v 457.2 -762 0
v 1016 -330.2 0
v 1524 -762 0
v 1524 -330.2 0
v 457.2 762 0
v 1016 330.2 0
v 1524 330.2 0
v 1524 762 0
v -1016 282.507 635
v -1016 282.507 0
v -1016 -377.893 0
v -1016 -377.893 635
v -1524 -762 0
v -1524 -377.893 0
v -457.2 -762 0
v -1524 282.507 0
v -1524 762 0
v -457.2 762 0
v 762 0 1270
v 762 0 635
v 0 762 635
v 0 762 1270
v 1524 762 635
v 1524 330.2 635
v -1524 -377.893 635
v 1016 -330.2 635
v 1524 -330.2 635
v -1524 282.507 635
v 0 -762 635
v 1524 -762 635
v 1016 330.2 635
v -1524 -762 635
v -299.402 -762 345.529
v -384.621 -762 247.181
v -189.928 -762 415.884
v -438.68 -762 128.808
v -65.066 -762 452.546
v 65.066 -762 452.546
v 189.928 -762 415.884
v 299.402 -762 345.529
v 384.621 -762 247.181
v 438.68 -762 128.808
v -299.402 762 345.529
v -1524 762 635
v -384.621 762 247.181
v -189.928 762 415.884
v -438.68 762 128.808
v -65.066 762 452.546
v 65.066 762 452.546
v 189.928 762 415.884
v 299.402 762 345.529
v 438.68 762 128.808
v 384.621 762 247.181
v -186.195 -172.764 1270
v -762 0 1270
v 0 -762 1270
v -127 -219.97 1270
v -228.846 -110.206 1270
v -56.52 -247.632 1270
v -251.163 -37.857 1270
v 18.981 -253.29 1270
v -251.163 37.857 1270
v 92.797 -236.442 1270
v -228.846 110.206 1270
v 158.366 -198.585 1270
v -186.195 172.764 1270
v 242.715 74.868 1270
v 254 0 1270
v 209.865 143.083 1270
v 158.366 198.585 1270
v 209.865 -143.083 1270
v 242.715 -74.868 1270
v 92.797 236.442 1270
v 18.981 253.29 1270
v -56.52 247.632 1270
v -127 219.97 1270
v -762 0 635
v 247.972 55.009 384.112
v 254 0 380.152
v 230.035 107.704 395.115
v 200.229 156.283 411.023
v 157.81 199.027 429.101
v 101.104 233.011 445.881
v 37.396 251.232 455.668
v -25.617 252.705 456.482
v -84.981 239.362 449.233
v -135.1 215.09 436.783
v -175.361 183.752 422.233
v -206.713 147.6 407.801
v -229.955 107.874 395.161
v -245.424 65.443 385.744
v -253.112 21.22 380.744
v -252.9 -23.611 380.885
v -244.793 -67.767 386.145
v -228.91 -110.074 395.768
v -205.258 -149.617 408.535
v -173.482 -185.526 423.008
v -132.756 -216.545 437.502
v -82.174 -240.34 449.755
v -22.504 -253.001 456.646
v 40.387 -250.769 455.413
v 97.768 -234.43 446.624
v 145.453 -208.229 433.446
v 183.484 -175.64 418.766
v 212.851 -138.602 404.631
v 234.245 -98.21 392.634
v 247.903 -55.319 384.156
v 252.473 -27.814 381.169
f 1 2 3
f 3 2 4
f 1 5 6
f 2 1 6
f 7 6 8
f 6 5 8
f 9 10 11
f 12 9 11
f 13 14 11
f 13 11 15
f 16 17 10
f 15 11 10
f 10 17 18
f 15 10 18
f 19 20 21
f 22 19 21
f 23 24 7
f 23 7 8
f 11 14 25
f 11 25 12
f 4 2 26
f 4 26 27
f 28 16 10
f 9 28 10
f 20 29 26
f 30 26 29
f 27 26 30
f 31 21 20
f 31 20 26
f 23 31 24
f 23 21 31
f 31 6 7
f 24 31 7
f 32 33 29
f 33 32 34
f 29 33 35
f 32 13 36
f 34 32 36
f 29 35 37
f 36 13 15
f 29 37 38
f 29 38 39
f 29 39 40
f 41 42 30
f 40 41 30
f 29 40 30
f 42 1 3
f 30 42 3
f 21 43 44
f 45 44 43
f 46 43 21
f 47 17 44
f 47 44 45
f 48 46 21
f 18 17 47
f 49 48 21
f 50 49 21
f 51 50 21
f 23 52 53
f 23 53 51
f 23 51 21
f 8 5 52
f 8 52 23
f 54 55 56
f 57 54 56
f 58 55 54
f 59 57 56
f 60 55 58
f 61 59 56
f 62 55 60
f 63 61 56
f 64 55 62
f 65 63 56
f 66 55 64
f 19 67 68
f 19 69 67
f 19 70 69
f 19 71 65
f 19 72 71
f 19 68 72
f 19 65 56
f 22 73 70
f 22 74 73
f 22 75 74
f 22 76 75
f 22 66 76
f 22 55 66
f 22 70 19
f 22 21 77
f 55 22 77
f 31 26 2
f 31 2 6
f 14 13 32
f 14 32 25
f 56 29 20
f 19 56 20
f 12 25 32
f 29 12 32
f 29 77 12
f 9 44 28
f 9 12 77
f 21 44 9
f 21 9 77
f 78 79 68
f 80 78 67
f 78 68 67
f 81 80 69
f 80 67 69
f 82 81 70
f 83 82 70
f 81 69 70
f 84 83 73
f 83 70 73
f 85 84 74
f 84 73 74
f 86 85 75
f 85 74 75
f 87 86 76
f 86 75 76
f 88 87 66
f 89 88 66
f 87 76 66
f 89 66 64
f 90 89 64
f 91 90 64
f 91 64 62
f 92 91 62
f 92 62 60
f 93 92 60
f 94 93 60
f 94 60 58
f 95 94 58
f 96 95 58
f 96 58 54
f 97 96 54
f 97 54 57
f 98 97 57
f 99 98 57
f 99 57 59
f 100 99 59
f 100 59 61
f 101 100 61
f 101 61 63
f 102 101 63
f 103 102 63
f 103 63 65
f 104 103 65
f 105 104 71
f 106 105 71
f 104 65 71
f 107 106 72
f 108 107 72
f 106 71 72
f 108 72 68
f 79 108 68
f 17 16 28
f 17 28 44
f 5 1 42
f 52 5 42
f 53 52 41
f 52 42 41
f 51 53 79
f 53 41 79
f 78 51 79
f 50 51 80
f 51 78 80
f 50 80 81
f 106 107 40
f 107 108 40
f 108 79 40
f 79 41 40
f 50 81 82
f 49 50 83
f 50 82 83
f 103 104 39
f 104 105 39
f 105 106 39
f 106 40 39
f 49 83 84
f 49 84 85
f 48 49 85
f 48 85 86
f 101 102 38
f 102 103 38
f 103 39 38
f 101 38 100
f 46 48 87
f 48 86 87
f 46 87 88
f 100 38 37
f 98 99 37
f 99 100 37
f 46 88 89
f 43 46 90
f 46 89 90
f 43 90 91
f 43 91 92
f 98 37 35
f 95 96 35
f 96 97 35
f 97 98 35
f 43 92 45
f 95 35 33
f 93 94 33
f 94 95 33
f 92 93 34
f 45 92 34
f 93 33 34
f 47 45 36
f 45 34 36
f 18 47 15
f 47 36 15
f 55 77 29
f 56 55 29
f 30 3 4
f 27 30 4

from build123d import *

# Parameters (mm, degrees)
F0_W      = 3048
F0_H      = 1524
F1_DEPTH  = 635
F3_DEPTH  = 635
F4_W      = 1016
F4_H      = 660.4
F5_DEPTH  = 986.6277
F6_W      = 1016
F6_H      = 660.4
F7_DEPTH  = 635.001
F8_R      = 457.2
F9_DEPTH  = 1524.001
F10_R     = 254
F11_DEPTH = 1270.001


with BuildPart() as f1:
    # F0 (on Top) → F1 (new body)
    with BuildSketch(Plane.XY):
        Rectangle(F0_W, F0_H)
    extrude(amount=F1_DEPTH)

    # F2 (on face) → F3 (join)
    with BuildSketch(Plane.XY.offset(635)):
        Polygon((762, 0), (0, 762), (-762, 0), (0, -762), align=None)
    extrude(amount=F3_DEPTH)

    # F4 (on face) → F5 (cut)
    with BuildSketch(Plane(origin=(0, 0, 0), x_dir=(1, 0, 0), z_dir=(0, 0, -1))):
        with Locations((-1524, 47.693055)):
            Rectangle(F4_W, F4_H)
    extrude(amount=-F5_DEPTH, mode=Mode.SUBTRACT)

    # F6 (on face) → F7 (cut, through all)
    with BuildSketch(Plane.XY.offset(635)):
        with Locations((1524, 0)):
            Rectangle(F6_W, F6_H)
    extrude(amount=-F7_DEPTH, mode=Mode.SUBTRACT)

    # F8 (on face) → F9 (cut, through all)
    with BuildSketch(Plane.XZ.offset(762)):
        Circle(F8_R)
    extrude(amount=-F9_DEPTH, mode=Mode.SUBTRACT)

    # F10 (on face) → F11 (cut, through all)
    with BuildSketch(Plane.XY.offset(1270)):
        Circle(F10_R)
    extrude(amount=-F11_DEPTH, mode=Mode.SUBTRACT)


solid = f1.part
